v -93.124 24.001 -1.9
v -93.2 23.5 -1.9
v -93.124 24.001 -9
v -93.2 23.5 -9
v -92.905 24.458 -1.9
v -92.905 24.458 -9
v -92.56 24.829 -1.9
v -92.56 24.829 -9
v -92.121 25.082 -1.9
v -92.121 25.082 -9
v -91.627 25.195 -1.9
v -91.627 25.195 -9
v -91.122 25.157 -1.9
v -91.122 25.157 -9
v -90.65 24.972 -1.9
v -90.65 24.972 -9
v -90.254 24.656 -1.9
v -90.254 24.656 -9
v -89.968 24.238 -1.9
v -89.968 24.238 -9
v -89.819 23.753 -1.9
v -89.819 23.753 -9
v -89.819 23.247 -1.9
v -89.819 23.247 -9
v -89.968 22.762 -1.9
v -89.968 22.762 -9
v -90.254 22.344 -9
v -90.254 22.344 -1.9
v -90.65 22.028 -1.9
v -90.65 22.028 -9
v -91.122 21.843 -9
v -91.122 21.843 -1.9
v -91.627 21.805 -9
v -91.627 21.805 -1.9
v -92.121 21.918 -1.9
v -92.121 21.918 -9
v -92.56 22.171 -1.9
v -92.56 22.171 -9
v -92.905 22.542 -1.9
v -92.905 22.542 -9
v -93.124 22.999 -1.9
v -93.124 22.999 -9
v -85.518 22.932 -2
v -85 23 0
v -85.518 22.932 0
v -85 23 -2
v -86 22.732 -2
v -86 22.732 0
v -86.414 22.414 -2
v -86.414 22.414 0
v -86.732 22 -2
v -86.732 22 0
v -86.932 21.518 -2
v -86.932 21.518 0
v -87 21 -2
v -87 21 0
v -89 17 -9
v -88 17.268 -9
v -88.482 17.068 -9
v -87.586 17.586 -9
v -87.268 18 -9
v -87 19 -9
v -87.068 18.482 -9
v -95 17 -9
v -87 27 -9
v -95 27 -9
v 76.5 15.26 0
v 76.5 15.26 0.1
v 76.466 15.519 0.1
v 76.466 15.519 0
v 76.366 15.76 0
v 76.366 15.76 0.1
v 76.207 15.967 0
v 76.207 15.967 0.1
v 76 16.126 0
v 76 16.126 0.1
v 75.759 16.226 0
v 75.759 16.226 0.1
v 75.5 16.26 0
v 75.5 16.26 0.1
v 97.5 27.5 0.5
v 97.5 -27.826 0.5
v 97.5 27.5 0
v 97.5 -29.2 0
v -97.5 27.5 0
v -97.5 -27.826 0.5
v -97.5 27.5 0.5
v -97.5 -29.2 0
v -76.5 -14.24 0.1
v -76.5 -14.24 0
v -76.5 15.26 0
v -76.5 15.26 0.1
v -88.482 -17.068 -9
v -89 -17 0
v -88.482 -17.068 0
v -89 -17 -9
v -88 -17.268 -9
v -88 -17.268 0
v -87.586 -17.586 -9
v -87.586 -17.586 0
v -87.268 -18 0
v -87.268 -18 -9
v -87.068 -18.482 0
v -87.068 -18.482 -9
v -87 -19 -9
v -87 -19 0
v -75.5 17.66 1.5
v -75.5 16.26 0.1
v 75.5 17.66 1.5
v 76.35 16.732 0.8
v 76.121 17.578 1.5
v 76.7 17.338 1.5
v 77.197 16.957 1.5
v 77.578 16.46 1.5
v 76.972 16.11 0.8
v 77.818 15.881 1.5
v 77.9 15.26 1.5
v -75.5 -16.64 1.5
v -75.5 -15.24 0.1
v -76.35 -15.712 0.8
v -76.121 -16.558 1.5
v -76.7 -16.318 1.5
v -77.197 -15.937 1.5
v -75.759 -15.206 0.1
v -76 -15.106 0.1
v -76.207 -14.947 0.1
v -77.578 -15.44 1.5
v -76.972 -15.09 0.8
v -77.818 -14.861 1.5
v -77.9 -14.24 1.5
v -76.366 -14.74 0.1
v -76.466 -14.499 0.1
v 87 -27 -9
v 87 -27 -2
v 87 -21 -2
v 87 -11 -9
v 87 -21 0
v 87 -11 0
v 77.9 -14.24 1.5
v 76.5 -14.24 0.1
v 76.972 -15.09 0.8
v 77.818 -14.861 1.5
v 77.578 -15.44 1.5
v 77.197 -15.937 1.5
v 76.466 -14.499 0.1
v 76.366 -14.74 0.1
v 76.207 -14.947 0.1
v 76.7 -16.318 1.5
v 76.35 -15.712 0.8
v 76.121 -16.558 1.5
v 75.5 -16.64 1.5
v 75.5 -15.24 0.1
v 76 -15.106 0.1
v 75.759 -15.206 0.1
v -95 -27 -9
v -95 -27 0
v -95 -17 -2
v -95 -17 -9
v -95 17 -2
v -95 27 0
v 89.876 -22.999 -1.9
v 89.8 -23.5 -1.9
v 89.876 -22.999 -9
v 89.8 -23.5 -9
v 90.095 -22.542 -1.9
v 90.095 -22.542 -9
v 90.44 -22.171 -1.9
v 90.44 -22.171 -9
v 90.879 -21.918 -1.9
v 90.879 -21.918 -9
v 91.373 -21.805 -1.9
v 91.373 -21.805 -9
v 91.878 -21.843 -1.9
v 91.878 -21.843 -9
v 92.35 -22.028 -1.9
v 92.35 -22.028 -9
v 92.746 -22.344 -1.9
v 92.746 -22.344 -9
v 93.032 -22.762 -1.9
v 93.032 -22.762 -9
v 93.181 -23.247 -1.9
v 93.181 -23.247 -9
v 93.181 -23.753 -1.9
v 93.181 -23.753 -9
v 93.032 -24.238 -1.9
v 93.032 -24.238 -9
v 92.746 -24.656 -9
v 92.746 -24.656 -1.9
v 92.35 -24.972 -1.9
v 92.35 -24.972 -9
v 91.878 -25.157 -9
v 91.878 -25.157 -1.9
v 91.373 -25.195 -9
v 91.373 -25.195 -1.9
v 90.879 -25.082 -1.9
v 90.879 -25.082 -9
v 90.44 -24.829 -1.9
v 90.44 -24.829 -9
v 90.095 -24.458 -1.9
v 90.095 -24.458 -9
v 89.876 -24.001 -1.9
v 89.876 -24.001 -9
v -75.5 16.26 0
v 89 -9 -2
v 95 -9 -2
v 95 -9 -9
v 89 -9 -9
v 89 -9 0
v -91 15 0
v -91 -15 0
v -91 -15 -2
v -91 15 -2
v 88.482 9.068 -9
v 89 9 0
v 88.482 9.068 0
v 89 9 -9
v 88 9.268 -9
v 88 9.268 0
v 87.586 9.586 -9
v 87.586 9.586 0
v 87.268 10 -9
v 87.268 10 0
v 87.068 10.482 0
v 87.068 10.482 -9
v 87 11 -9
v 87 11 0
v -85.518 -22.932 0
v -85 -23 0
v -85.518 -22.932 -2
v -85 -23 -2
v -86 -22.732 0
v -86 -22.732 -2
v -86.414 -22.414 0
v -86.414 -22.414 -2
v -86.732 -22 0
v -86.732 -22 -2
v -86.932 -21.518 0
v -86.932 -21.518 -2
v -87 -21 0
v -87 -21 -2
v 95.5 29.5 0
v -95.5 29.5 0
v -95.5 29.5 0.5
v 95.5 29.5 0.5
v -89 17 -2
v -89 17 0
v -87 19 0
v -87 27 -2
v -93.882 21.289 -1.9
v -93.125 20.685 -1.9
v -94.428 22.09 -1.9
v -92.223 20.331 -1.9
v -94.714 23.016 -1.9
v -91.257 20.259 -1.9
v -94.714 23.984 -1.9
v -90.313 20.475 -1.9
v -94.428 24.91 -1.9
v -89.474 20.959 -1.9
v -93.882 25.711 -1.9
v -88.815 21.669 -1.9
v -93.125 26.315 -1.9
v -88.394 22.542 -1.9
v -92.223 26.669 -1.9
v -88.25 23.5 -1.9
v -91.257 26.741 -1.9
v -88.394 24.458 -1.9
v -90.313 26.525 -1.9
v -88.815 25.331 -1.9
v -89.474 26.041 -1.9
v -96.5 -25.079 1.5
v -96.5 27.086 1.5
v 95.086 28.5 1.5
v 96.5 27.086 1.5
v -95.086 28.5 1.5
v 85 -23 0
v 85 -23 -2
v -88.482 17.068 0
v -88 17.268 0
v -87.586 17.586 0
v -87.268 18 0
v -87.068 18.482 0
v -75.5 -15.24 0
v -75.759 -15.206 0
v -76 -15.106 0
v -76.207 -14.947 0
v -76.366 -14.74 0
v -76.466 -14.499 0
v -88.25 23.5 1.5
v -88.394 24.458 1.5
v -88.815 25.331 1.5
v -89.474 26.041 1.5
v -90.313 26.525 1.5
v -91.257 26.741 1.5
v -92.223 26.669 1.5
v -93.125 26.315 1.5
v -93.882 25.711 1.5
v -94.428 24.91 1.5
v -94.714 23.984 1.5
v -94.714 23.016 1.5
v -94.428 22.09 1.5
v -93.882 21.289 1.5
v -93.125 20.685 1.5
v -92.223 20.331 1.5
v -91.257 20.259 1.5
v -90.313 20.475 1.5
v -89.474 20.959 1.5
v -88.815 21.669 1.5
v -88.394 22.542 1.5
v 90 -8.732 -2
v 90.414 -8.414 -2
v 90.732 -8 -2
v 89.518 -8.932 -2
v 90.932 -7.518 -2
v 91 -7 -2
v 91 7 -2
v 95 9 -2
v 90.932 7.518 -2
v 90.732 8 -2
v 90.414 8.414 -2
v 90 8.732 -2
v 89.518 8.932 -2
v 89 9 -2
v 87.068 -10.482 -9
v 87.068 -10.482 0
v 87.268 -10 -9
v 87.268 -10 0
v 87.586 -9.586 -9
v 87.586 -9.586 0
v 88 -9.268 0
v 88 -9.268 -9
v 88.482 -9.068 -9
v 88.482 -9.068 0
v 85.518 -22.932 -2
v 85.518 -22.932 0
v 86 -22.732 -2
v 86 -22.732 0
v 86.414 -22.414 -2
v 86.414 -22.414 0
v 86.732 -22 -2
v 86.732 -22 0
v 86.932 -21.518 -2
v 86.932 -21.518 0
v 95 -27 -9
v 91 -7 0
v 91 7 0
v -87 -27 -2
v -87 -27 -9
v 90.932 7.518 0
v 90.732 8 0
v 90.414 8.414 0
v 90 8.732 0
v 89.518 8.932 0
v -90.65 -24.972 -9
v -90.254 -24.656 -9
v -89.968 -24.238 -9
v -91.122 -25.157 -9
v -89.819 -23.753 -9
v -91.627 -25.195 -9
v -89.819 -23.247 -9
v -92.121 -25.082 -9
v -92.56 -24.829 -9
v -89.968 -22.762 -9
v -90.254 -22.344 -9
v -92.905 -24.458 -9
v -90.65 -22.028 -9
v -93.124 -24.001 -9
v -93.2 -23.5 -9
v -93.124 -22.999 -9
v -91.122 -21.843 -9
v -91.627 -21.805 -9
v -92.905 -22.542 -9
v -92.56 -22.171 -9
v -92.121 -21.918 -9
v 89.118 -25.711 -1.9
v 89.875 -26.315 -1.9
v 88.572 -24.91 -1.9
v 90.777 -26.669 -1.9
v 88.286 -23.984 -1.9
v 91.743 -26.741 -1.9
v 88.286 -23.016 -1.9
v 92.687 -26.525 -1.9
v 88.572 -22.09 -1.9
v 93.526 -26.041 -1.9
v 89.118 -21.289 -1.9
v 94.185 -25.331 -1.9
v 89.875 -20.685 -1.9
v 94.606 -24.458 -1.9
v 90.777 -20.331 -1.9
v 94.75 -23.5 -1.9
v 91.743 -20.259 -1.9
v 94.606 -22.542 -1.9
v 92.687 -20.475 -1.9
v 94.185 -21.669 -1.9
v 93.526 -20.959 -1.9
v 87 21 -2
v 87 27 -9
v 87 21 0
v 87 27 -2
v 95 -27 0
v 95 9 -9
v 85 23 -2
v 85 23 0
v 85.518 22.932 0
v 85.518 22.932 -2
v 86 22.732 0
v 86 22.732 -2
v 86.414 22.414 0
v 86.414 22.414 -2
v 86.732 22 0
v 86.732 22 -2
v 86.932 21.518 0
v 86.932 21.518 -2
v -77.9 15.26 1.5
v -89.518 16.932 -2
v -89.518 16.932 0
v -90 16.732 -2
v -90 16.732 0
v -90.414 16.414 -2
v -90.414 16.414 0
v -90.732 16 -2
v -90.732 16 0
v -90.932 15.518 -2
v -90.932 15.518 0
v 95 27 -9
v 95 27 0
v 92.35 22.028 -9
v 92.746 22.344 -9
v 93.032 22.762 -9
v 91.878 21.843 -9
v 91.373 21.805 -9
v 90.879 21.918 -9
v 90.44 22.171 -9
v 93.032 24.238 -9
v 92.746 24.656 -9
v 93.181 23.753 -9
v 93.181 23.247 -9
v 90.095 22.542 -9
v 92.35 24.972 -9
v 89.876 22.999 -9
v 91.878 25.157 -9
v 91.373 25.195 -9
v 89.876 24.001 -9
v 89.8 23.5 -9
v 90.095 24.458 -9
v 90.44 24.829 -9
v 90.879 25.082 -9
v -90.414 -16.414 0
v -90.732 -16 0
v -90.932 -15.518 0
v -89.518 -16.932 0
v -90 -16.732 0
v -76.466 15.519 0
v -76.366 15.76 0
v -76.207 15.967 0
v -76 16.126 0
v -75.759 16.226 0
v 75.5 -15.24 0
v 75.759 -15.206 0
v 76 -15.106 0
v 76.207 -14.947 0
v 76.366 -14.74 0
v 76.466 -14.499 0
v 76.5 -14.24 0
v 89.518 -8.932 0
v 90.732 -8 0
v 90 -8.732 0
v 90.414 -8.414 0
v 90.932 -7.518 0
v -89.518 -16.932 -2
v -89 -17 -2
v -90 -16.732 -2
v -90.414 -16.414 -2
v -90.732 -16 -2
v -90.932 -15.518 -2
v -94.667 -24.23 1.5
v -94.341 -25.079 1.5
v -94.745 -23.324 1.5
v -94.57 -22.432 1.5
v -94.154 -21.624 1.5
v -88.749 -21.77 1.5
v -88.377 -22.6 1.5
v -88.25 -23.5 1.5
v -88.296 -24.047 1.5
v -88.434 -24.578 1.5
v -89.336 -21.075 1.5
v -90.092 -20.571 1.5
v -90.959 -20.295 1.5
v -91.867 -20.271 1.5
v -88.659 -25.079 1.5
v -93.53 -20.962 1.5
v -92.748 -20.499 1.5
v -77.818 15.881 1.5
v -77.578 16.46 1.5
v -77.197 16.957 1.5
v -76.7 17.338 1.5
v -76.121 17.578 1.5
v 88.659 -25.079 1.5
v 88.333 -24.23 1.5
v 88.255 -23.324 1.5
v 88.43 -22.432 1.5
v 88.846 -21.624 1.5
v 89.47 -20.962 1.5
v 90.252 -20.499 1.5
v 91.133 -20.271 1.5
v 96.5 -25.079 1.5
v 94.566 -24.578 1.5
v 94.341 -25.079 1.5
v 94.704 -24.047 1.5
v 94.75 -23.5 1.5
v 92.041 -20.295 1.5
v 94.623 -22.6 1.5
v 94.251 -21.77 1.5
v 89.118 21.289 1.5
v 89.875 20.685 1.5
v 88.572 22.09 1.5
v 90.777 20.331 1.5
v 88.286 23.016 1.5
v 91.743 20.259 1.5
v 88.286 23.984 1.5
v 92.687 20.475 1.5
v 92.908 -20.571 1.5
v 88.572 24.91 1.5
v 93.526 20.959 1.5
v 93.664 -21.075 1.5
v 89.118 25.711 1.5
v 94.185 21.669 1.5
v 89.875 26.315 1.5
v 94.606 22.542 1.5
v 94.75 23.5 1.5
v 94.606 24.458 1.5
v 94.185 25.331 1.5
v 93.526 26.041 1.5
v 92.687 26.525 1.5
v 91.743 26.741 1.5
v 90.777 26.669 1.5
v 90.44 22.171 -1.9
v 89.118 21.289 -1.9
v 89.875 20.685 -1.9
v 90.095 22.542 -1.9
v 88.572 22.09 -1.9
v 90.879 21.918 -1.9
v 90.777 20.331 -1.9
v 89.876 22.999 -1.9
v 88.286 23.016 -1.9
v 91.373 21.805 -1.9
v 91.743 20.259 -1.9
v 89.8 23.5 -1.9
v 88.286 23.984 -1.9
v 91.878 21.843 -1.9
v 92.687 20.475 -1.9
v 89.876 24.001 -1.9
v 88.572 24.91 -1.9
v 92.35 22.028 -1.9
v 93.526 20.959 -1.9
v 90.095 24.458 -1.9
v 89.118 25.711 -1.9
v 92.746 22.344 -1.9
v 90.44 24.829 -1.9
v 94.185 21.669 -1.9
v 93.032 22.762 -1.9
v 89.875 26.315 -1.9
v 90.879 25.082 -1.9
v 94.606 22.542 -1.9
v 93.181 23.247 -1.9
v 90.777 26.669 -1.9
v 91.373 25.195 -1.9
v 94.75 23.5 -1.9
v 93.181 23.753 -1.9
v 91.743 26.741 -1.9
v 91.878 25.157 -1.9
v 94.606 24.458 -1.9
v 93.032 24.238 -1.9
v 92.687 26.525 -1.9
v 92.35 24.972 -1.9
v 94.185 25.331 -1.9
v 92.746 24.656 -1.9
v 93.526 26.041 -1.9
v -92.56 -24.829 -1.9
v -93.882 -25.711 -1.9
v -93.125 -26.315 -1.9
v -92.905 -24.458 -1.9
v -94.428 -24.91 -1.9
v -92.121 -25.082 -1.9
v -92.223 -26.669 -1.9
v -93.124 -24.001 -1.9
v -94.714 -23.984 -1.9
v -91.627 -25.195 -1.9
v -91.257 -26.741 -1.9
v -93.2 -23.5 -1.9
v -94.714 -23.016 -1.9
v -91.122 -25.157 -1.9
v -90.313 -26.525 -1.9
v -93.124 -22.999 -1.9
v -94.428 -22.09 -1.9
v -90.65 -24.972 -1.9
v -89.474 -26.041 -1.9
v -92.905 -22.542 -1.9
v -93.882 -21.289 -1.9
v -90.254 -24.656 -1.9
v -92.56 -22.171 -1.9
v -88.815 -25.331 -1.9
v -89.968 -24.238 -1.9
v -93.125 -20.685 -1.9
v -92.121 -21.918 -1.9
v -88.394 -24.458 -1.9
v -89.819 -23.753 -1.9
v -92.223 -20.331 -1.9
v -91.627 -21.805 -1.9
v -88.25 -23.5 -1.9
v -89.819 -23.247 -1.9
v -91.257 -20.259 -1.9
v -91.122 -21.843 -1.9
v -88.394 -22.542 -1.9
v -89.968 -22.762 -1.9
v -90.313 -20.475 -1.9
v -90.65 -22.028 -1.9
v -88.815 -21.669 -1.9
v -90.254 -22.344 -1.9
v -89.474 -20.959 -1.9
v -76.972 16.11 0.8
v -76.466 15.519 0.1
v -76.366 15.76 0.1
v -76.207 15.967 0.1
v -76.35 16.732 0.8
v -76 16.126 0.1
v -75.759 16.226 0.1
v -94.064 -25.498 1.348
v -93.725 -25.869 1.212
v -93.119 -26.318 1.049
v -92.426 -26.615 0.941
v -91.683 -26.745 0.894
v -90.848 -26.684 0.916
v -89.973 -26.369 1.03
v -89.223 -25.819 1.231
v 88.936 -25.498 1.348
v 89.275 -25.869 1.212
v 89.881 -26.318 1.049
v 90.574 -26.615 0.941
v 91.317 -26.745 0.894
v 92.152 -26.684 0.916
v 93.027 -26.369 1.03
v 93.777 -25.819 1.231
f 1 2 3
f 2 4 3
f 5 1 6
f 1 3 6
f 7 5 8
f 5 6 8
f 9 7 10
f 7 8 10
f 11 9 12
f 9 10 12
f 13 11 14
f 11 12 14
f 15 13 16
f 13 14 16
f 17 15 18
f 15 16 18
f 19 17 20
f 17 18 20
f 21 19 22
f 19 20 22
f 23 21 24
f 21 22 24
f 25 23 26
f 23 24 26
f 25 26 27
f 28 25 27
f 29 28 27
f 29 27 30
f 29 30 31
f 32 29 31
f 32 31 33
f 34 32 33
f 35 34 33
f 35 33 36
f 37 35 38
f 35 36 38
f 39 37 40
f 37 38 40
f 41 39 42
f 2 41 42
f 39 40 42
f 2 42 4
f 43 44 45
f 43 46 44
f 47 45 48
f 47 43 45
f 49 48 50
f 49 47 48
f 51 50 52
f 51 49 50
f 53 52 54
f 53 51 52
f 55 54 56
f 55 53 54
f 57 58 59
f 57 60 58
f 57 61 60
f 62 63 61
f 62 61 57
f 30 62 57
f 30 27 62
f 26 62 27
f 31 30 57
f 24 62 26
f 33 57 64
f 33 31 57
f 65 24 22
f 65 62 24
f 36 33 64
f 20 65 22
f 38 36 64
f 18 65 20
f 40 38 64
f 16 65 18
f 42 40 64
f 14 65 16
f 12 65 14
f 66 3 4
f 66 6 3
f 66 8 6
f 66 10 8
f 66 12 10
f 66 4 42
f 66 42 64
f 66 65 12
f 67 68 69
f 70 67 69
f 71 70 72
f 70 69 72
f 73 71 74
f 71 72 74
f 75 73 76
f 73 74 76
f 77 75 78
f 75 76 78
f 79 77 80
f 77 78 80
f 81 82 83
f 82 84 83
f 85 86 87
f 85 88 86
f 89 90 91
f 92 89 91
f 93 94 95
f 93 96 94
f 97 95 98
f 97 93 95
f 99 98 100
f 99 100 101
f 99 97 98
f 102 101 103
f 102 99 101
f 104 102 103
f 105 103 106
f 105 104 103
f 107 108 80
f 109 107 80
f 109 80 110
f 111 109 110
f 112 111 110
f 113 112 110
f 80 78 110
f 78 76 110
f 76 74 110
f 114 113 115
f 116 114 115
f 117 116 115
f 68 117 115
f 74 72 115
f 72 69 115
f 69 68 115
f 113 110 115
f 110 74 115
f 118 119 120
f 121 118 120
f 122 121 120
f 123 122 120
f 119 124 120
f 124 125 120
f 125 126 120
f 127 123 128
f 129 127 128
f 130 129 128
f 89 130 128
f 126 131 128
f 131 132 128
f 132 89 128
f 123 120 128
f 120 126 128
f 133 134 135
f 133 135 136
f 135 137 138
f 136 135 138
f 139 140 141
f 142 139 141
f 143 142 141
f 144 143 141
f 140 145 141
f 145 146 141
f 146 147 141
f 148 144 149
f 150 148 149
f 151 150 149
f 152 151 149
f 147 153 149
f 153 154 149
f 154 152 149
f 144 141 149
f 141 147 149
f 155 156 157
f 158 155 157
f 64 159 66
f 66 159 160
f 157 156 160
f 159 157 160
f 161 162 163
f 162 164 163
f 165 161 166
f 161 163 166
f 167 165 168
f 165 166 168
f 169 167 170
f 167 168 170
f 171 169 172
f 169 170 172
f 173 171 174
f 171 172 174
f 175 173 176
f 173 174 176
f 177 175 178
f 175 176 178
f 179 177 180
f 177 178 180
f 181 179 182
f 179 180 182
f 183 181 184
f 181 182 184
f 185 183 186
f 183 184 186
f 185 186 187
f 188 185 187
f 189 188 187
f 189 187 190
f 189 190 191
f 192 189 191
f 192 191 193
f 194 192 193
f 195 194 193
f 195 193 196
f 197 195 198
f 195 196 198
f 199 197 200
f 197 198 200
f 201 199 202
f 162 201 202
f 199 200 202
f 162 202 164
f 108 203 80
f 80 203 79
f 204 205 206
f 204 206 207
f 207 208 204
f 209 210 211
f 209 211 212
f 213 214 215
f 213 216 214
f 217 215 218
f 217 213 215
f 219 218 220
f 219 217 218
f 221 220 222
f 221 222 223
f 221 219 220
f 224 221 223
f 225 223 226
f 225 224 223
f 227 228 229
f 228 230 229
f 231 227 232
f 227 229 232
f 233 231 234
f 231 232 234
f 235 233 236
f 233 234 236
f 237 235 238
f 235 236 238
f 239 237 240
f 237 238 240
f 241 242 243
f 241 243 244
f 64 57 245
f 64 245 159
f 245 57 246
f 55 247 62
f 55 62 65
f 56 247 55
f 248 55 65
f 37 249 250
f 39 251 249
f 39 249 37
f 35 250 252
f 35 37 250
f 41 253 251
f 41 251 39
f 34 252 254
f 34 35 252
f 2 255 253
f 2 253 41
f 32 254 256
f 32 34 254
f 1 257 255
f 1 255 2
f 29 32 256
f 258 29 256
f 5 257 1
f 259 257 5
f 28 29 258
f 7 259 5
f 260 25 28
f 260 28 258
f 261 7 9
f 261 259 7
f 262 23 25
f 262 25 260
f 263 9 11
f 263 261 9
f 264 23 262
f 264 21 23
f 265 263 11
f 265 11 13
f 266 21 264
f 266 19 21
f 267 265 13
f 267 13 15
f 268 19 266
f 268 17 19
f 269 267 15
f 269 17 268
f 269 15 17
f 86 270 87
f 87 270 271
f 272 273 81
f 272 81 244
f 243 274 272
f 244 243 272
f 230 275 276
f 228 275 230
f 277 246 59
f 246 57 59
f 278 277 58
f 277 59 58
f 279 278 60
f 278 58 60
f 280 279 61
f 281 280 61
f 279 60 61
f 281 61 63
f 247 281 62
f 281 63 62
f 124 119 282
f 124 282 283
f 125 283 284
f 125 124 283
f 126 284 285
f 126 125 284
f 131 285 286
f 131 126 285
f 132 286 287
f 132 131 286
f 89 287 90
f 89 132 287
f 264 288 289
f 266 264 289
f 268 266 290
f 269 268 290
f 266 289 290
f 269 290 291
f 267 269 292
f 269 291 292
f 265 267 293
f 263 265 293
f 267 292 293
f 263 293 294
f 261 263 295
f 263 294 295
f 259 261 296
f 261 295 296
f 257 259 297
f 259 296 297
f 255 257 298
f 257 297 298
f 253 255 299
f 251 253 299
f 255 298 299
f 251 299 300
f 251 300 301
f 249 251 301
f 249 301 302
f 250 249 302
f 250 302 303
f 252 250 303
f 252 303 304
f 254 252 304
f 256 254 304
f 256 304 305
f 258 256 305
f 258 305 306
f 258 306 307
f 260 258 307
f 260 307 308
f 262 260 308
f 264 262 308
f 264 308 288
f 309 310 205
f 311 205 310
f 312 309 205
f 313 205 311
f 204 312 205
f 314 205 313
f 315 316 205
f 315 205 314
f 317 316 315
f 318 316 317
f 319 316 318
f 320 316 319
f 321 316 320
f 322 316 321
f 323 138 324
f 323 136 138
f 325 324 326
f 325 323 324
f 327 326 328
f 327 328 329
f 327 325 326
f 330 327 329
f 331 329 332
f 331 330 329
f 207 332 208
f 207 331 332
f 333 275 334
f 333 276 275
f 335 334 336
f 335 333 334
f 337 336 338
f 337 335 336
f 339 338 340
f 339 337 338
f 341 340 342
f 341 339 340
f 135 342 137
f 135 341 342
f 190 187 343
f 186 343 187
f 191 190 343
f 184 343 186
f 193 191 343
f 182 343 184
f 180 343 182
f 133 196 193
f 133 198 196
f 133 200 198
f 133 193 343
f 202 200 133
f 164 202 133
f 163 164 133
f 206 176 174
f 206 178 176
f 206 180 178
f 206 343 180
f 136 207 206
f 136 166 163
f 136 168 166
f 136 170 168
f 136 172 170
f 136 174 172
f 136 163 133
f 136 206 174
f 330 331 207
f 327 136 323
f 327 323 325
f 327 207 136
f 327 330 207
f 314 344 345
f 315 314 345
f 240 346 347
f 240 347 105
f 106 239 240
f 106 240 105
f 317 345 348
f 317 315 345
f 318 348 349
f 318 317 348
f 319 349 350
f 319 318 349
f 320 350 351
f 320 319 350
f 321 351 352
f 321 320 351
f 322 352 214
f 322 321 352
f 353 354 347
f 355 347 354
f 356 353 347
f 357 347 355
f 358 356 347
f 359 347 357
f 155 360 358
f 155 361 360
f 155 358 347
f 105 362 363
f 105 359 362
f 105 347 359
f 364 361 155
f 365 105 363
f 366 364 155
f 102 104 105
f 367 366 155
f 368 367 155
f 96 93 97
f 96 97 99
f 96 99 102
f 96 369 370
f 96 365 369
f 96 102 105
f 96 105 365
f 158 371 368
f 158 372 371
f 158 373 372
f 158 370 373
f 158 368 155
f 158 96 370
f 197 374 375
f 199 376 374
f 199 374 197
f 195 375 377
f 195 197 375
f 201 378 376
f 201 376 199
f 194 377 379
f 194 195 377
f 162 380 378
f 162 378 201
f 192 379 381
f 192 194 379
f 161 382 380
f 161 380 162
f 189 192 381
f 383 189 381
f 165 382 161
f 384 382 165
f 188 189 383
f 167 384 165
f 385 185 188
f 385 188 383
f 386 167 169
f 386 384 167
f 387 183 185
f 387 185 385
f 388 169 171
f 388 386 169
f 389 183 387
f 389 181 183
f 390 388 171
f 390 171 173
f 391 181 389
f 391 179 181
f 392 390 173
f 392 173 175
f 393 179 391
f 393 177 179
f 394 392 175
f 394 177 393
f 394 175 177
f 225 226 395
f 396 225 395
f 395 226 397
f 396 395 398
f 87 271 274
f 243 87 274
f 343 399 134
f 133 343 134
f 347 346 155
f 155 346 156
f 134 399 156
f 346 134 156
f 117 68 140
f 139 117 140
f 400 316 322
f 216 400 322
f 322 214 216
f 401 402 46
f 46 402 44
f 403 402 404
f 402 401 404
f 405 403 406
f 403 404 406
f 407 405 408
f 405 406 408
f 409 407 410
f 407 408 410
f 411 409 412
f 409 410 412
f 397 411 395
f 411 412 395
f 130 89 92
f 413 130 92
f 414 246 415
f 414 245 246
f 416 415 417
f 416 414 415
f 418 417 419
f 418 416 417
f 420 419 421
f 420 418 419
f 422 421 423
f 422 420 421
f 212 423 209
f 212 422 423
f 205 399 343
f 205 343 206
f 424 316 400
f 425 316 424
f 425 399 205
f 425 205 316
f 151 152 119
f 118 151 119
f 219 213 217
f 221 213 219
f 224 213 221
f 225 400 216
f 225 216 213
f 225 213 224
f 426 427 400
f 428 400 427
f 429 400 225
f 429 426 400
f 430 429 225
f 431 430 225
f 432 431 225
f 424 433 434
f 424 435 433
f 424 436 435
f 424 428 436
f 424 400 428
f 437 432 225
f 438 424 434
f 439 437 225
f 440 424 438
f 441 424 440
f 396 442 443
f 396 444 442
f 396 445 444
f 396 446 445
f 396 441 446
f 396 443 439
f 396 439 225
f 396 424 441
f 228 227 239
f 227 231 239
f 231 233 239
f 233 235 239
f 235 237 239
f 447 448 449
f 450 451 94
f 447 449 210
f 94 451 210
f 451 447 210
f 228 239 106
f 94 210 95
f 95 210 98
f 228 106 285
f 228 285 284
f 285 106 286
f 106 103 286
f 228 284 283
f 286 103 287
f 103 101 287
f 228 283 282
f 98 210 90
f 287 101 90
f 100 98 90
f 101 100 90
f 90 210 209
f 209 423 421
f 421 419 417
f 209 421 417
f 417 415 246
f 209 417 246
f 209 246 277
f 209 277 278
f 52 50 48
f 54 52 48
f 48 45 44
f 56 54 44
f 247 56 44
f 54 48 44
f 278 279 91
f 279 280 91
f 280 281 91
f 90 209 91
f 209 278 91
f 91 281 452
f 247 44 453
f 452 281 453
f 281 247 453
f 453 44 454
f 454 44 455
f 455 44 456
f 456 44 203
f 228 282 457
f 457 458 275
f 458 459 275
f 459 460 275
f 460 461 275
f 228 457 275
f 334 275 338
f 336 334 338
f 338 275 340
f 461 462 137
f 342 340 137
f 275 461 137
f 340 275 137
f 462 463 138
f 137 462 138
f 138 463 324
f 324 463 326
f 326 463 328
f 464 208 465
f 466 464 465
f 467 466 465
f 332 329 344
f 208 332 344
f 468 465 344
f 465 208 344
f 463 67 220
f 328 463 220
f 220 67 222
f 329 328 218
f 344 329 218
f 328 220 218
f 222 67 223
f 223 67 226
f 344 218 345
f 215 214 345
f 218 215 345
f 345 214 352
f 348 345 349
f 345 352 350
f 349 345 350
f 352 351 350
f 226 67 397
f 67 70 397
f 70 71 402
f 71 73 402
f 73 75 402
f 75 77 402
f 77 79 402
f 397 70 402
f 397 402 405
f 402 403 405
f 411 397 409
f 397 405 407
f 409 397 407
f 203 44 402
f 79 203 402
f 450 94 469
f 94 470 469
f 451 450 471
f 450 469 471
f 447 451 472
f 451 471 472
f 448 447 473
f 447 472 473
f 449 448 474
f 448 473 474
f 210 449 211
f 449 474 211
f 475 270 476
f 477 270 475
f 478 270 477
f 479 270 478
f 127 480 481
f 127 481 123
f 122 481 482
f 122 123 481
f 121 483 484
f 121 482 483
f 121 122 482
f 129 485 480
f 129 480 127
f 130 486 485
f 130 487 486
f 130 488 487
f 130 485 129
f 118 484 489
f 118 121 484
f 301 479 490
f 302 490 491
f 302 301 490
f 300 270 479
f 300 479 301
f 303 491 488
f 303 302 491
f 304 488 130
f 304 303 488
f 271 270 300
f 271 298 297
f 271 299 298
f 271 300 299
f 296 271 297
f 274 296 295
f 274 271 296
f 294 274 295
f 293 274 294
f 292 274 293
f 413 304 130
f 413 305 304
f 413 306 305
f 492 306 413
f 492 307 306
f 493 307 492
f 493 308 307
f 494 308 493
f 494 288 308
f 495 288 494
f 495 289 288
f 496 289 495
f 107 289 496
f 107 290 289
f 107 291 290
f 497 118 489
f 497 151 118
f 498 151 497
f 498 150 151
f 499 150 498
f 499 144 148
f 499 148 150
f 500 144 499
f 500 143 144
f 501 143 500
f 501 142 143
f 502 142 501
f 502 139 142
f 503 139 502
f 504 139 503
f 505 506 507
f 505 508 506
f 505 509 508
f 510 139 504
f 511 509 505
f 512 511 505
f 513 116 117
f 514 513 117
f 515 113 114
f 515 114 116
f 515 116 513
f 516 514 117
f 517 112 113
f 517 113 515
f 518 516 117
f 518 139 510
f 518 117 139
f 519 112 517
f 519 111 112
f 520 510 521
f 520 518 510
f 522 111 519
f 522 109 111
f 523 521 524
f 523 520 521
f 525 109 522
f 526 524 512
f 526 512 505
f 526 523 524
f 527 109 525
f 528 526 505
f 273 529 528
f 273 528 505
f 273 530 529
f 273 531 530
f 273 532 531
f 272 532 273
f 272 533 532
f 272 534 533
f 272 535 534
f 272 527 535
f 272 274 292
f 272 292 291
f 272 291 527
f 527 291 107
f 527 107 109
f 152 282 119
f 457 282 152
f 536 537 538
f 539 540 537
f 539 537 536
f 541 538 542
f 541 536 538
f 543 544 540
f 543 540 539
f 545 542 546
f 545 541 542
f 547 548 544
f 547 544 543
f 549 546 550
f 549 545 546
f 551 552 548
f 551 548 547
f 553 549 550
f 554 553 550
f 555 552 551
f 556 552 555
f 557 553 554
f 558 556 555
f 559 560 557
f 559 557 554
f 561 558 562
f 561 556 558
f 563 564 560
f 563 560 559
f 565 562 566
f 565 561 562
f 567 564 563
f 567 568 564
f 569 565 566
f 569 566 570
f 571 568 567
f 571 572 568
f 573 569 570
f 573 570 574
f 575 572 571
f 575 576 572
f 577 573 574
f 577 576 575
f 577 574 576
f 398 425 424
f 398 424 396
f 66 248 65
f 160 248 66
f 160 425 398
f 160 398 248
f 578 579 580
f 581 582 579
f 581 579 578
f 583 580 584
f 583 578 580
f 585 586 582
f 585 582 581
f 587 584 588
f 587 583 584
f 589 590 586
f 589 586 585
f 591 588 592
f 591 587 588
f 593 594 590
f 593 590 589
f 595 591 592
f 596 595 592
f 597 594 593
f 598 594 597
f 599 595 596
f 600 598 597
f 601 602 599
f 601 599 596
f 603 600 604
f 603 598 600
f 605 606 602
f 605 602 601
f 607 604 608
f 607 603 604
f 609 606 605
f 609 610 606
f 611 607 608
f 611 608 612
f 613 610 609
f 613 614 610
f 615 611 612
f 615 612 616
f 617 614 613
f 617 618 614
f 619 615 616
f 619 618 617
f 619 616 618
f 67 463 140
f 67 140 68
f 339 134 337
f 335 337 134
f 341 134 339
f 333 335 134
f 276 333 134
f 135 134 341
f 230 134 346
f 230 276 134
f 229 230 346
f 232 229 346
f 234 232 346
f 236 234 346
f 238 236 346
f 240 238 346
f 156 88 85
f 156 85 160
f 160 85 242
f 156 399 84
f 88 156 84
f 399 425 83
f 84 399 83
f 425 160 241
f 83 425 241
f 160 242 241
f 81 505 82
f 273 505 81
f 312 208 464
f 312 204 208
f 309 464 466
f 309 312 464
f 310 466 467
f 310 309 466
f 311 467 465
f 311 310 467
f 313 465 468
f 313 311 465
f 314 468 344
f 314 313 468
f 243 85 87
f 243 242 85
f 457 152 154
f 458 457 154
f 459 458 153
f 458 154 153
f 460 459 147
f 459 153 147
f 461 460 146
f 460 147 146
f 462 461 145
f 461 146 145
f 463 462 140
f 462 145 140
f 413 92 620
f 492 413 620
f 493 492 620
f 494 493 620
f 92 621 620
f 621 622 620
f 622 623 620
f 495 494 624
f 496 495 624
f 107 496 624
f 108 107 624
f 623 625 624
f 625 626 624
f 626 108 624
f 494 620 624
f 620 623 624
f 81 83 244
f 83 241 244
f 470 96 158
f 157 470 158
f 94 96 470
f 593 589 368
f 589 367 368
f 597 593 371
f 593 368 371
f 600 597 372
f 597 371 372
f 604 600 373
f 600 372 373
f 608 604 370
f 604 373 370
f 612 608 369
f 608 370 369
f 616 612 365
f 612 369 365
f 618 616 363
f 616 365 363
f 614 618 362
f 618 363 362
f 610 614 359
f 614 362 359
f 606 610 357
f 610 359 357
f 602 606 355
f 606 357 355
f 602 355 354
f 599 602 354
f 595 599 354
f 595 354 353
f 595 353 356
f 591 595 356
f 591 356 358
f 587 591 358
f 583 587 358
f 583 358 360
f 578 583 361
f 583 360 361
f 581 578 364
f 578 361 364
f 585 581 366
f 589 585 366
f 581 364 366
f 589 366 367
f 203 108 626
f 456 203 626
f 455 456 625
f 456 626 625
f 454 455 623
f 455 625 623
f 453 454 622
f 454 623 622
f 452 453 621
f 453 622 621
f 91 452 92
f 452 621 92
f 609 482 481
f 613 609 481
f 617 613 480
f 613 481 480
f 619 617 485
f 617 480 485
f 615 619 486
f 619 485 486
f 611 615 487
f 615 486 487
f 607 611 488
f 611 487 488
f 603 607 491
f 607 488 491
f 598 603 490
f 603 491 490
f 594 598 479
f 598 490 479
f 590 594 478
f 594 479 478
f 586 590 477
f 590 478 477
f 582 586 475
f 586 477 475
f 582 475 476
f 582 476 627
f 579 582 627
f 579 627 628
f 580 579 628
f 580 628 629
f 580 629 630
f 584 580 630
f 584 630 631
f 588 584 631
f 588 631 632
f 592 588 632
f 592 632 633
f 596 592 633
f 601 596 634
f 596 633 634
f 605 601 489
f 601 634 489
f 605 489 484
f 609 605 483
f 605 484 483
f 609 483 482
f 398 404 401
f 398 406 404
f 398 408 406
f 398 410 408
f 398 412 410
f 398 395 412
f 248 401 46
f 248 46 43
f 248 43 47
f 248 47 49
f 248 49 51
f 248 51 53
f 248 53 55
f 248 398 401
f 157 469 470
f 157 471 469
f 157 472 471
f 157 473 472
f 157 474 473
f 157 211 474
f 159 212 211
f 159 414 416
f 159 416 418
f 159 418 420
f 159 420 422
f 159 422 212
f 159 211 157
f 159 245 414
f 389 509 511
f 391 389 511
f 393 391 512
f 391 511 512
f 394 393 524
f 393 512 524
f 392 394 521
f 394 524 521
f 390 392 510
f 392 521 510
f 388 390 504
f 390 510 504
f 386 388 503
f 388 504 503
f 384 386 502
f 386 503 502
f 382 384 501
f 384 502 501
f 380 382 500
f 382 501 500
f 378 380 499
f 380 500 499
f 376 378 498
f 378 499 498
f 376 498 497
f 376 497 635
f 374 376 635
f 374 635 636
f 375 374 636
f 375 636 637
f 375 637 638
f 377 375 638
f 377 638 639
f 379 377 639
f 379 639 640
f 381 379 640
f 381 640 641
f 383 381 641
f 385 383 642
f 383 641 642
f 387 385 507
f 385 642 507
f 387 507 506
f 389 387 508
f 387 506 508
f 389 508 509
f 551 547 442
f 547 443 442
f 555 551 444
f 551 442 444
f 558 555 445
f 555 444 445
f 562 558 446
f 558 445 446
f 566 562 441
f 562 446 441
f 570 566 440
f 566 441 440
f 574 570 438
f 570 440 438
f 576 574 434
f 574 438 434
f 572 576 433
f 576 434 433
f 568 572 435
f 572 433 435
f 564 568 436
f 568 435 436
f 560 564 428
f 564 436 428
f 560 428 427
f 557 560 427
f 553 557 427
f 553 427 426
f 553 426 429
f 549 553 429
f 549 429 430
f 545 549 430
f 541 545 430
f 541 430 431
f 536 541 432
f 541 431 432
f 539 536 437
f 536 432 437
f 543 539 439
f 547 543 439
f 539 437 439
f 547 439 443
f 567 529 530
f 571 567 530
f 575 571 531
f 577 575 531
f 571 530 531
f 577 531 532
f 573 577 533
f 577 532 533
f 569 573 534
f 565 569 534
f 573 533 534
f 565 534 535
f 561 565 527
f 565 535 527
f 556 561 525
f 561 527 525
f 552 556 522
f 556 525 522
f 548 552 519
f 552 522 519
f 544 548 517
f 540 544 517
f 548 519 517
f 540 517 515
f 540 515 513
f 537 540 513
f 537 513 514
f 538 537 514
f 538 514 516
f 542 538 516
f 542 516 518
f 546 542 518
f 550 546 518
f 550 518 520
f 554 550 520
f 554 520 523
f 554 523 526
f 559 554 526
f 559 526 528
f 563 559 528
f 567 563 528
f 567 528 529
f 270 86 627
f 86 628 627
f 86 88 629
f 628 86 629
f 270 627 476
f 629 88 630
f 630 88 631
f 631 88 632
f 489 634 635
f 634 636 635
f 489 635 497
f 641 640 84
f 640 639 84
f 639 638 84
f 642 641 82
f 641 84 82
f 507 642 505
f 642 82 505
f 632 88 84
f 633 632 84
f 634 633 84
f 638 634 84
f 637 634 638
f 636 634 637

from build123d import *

# Parameters (mm, degrees)
CROQUIS1_W                                           = 195
CROQUIS1_H                                           = 58.7
CROQUIS1_W_2                                         = 153
CROQUIS1_H_2                                         = 31.5
SALIENTE_EXTRUIR1_DEPTH                              = 1.5
REDONDEO1_R                                          = 1
CHAFL_N1_SIZE                                        = 1.4
CORTAR_EXTRUIR1_DEPTH                                = 198.22449138
CROQUIS3_W                                           = 8
CROQUIS3_H                                           = 18
CROQUIS3_H_2                                         = 10
SALIENTE_EXTRUIR2_DEPTH                              = 9
CROQUIS4_W                                           = 174
CROQUIS4_H                                           = 4
CROQUIS4_W_2                                         = 4
CROQUIS4_H_2                                         = 18
CROQUIS4_H_3                                         = 34
SALIENTE_EXTRUIR3_DEPTH                              = 2
REDONDEO2_R                                          = 2
REFRENTADO_PARA_TORNILLO_CON_CABEZA_HUEC_D           = 3.4
REFRENTADO_PARA_TORNILLO_CON_CABEZA_HUEC_CBORE_D     = 6.5
REFRENTADO_PARA_TORNILLO_CON_CABEZA_HUEC_CBORE_DEPTH = 3.4
CHAFL_N2_SIZE                                        = 2
CHAFL_N3_SIZE                                        = 1


with BuildPart() as part:
    # Croquis1 → Saliente-Extruir1 (new body)
    with BuildSketch(Plane.XY):
        with Locations((0, 0.15)):
            Rectangle(CROQUIS1_W, CROQUIS1_H)
        with Locations((0, 0.51)):
            Rectangle(CROQUIS1_W_2, CROQUIS1_H_2, mode=Mode.SUBTRACT)
    extrude(amount=SALIENTE_EXTRUIR1_DEPTH)

    # Redondeo1
    redondeo1_edges = [part.edges().sort_by_distance(p)[0] for p in [
        (-76.5, 16.26, 0.75),
        (-76.5, -15.24, 0.75),
        (76.5, -15.24, 0.75),
        (76.5, 16.26, 0.75),
    ]]
    fillet(redondeo1_edges, radius=REDONDEO1_R)

    # Chaflán1
    chafl_n1_edges = [part.edges().sort_by_distance(p)[0] for p in [
        (-76.5, 0.51, 1.5),
        (0, -15.24, 1.5),
        (76.5, 0.51, 1.5),
        (0, 16.26, 1.5),
        (-76.207106781, -14.947106781, 1.5),
        (76.207106781, -14.947106781, 1.5),
        (76.207106781, 15.967106781, 1.5),
        (-76.207106781, 15.967106781, 1.5),
    ]]
    chamfer(chafl_n1_edges, length=CHAFL_N1_SIZE)

    # Croquis2 → Cortar-Extruir1 (cut, through all)
    with BuildSketch(Plane(origin=(97.5, 0, 0), x_dir=(0, 0, -1), z_dir=(1, 0, 0))):
        Polygon((0, -29.2), (-1.5, -25.078783871), (-1.5, -29.2), align=None)
    extrude(amount=-CORTAR_EXTRUIR1_DEPTH, mode=Mode.SUBTRACT)

    # Croquis3 → Saliente-Extruir2 (add)
    with BuildSketch(Plane(origin=(0, 0, 0), x_dir=(-1, 0, 0), z_dir=(0, 0, -1))):
        with Locations((-91, 18)):
            Rectangle(CROQUIS3_W, CROQUIS3_H)
        with Locations((-91, -18)):
            Rectangle(CROQUIS3_W, CROQUIS3_H)
        with Locations((91, 22)):
            Rectangle(CROQUIS3_W, CROQUIS3_H_2)
        with Locations((91, -22)):
            Rectangle(CROQUIS3_W, CROQUIS3_H_2)
    extrude(amount=SALIENTE_EXTRUIR2_DEPTH)

    # Croquis4 → Saliente-Extruir3 (add)
    with BuildSketch(Plane(origin=(0, 0, 0), x_dir=(-1, 0, 0), z_dir=(0, 0, -1))):
        with Locations((0, 25)):
            Rectangle(CROQUIS4_W, CROQUIS4_H)
        with Locations((0, -25)):
            Rectangle(CROQUIS4_W, CROQUIS4_H)
        with Locations((-93, 0)):
            Rectangle(CROQUIS4_W_2, CROQUIS4_H_2)
        with Locations((93, 0)):
            Rectangle(CROQUIS4_W_2, CROQUIS4_H_3)
    extrude(amount=SALIENTE_EXTRUIR3_DEPTH)

    # Redondeo2
    redondeo2_edges = [part.edges().sort_by_distance(p)[0] for p in [
        (-87, 17, -4.5),
        (-87, -17, -4.5),
        (87, -9, -4.5),
        (87, 9, -4.5),
        (91, -9, -1),
        (87, -23, -1),
        (-87, -23, -1),
        (-91, -17, -1),
        (-91, 17, -1),
        (-87, 23, -1),
        (87, 23, -1),
        (91, 9, -1),
    ]]
    fillet(redondeo2_edges, radius=REDONDEO2_R - 0.0001)  # a hair under: the kernel refuses the full size

    # Refrentado para tornillo con cabeza hueca de M31 (through all)
    with Locations(Plane.XY.offset(1.5)):
        with Locations((-91.5, 23.5), (-91.5, -23.5), (91.5, -23.5), (91.5, 23.5)):
            CounterBoreHole(REFRENTADO_PARA_TORNILLO_CON_CABEZA_HUEC_D / 2, REFRENTADO_PARA_TORNILLO_CON_CABEZA_HUEC_CBORE_D / 2, REFRENTADO_PARA_TORNILLO_CON_CABEZA_HUEC_CBORE_DEPTH)

    # Chaflán2
    chafl_n2_edges = [part.edges().sort_by_distance(p)[0] for p in [
        (-97.5, 29.5, 0.75),
        (97.5, 29.5, 0.75),
    ]]
    chamfer(chafl_n2_edges, length=CHAFL_N2_SIZE)

    # Chaflán3
    chafl_n3_edges = [part.edges().sort_by_distance(p)[0] for p in [
        (0, 29.5, 1.5),
        (-97.5, 1.210608065, 1.5),
        (-96.5, 28.5, 1.5),
        (96.5, 28.5, 1.5),
        (97.5, 1.210608065, 1.5),
    ]]
    chamfer(chafl_n3_edges, length=CHAFL_N3_SIZE)


solid = part.part
